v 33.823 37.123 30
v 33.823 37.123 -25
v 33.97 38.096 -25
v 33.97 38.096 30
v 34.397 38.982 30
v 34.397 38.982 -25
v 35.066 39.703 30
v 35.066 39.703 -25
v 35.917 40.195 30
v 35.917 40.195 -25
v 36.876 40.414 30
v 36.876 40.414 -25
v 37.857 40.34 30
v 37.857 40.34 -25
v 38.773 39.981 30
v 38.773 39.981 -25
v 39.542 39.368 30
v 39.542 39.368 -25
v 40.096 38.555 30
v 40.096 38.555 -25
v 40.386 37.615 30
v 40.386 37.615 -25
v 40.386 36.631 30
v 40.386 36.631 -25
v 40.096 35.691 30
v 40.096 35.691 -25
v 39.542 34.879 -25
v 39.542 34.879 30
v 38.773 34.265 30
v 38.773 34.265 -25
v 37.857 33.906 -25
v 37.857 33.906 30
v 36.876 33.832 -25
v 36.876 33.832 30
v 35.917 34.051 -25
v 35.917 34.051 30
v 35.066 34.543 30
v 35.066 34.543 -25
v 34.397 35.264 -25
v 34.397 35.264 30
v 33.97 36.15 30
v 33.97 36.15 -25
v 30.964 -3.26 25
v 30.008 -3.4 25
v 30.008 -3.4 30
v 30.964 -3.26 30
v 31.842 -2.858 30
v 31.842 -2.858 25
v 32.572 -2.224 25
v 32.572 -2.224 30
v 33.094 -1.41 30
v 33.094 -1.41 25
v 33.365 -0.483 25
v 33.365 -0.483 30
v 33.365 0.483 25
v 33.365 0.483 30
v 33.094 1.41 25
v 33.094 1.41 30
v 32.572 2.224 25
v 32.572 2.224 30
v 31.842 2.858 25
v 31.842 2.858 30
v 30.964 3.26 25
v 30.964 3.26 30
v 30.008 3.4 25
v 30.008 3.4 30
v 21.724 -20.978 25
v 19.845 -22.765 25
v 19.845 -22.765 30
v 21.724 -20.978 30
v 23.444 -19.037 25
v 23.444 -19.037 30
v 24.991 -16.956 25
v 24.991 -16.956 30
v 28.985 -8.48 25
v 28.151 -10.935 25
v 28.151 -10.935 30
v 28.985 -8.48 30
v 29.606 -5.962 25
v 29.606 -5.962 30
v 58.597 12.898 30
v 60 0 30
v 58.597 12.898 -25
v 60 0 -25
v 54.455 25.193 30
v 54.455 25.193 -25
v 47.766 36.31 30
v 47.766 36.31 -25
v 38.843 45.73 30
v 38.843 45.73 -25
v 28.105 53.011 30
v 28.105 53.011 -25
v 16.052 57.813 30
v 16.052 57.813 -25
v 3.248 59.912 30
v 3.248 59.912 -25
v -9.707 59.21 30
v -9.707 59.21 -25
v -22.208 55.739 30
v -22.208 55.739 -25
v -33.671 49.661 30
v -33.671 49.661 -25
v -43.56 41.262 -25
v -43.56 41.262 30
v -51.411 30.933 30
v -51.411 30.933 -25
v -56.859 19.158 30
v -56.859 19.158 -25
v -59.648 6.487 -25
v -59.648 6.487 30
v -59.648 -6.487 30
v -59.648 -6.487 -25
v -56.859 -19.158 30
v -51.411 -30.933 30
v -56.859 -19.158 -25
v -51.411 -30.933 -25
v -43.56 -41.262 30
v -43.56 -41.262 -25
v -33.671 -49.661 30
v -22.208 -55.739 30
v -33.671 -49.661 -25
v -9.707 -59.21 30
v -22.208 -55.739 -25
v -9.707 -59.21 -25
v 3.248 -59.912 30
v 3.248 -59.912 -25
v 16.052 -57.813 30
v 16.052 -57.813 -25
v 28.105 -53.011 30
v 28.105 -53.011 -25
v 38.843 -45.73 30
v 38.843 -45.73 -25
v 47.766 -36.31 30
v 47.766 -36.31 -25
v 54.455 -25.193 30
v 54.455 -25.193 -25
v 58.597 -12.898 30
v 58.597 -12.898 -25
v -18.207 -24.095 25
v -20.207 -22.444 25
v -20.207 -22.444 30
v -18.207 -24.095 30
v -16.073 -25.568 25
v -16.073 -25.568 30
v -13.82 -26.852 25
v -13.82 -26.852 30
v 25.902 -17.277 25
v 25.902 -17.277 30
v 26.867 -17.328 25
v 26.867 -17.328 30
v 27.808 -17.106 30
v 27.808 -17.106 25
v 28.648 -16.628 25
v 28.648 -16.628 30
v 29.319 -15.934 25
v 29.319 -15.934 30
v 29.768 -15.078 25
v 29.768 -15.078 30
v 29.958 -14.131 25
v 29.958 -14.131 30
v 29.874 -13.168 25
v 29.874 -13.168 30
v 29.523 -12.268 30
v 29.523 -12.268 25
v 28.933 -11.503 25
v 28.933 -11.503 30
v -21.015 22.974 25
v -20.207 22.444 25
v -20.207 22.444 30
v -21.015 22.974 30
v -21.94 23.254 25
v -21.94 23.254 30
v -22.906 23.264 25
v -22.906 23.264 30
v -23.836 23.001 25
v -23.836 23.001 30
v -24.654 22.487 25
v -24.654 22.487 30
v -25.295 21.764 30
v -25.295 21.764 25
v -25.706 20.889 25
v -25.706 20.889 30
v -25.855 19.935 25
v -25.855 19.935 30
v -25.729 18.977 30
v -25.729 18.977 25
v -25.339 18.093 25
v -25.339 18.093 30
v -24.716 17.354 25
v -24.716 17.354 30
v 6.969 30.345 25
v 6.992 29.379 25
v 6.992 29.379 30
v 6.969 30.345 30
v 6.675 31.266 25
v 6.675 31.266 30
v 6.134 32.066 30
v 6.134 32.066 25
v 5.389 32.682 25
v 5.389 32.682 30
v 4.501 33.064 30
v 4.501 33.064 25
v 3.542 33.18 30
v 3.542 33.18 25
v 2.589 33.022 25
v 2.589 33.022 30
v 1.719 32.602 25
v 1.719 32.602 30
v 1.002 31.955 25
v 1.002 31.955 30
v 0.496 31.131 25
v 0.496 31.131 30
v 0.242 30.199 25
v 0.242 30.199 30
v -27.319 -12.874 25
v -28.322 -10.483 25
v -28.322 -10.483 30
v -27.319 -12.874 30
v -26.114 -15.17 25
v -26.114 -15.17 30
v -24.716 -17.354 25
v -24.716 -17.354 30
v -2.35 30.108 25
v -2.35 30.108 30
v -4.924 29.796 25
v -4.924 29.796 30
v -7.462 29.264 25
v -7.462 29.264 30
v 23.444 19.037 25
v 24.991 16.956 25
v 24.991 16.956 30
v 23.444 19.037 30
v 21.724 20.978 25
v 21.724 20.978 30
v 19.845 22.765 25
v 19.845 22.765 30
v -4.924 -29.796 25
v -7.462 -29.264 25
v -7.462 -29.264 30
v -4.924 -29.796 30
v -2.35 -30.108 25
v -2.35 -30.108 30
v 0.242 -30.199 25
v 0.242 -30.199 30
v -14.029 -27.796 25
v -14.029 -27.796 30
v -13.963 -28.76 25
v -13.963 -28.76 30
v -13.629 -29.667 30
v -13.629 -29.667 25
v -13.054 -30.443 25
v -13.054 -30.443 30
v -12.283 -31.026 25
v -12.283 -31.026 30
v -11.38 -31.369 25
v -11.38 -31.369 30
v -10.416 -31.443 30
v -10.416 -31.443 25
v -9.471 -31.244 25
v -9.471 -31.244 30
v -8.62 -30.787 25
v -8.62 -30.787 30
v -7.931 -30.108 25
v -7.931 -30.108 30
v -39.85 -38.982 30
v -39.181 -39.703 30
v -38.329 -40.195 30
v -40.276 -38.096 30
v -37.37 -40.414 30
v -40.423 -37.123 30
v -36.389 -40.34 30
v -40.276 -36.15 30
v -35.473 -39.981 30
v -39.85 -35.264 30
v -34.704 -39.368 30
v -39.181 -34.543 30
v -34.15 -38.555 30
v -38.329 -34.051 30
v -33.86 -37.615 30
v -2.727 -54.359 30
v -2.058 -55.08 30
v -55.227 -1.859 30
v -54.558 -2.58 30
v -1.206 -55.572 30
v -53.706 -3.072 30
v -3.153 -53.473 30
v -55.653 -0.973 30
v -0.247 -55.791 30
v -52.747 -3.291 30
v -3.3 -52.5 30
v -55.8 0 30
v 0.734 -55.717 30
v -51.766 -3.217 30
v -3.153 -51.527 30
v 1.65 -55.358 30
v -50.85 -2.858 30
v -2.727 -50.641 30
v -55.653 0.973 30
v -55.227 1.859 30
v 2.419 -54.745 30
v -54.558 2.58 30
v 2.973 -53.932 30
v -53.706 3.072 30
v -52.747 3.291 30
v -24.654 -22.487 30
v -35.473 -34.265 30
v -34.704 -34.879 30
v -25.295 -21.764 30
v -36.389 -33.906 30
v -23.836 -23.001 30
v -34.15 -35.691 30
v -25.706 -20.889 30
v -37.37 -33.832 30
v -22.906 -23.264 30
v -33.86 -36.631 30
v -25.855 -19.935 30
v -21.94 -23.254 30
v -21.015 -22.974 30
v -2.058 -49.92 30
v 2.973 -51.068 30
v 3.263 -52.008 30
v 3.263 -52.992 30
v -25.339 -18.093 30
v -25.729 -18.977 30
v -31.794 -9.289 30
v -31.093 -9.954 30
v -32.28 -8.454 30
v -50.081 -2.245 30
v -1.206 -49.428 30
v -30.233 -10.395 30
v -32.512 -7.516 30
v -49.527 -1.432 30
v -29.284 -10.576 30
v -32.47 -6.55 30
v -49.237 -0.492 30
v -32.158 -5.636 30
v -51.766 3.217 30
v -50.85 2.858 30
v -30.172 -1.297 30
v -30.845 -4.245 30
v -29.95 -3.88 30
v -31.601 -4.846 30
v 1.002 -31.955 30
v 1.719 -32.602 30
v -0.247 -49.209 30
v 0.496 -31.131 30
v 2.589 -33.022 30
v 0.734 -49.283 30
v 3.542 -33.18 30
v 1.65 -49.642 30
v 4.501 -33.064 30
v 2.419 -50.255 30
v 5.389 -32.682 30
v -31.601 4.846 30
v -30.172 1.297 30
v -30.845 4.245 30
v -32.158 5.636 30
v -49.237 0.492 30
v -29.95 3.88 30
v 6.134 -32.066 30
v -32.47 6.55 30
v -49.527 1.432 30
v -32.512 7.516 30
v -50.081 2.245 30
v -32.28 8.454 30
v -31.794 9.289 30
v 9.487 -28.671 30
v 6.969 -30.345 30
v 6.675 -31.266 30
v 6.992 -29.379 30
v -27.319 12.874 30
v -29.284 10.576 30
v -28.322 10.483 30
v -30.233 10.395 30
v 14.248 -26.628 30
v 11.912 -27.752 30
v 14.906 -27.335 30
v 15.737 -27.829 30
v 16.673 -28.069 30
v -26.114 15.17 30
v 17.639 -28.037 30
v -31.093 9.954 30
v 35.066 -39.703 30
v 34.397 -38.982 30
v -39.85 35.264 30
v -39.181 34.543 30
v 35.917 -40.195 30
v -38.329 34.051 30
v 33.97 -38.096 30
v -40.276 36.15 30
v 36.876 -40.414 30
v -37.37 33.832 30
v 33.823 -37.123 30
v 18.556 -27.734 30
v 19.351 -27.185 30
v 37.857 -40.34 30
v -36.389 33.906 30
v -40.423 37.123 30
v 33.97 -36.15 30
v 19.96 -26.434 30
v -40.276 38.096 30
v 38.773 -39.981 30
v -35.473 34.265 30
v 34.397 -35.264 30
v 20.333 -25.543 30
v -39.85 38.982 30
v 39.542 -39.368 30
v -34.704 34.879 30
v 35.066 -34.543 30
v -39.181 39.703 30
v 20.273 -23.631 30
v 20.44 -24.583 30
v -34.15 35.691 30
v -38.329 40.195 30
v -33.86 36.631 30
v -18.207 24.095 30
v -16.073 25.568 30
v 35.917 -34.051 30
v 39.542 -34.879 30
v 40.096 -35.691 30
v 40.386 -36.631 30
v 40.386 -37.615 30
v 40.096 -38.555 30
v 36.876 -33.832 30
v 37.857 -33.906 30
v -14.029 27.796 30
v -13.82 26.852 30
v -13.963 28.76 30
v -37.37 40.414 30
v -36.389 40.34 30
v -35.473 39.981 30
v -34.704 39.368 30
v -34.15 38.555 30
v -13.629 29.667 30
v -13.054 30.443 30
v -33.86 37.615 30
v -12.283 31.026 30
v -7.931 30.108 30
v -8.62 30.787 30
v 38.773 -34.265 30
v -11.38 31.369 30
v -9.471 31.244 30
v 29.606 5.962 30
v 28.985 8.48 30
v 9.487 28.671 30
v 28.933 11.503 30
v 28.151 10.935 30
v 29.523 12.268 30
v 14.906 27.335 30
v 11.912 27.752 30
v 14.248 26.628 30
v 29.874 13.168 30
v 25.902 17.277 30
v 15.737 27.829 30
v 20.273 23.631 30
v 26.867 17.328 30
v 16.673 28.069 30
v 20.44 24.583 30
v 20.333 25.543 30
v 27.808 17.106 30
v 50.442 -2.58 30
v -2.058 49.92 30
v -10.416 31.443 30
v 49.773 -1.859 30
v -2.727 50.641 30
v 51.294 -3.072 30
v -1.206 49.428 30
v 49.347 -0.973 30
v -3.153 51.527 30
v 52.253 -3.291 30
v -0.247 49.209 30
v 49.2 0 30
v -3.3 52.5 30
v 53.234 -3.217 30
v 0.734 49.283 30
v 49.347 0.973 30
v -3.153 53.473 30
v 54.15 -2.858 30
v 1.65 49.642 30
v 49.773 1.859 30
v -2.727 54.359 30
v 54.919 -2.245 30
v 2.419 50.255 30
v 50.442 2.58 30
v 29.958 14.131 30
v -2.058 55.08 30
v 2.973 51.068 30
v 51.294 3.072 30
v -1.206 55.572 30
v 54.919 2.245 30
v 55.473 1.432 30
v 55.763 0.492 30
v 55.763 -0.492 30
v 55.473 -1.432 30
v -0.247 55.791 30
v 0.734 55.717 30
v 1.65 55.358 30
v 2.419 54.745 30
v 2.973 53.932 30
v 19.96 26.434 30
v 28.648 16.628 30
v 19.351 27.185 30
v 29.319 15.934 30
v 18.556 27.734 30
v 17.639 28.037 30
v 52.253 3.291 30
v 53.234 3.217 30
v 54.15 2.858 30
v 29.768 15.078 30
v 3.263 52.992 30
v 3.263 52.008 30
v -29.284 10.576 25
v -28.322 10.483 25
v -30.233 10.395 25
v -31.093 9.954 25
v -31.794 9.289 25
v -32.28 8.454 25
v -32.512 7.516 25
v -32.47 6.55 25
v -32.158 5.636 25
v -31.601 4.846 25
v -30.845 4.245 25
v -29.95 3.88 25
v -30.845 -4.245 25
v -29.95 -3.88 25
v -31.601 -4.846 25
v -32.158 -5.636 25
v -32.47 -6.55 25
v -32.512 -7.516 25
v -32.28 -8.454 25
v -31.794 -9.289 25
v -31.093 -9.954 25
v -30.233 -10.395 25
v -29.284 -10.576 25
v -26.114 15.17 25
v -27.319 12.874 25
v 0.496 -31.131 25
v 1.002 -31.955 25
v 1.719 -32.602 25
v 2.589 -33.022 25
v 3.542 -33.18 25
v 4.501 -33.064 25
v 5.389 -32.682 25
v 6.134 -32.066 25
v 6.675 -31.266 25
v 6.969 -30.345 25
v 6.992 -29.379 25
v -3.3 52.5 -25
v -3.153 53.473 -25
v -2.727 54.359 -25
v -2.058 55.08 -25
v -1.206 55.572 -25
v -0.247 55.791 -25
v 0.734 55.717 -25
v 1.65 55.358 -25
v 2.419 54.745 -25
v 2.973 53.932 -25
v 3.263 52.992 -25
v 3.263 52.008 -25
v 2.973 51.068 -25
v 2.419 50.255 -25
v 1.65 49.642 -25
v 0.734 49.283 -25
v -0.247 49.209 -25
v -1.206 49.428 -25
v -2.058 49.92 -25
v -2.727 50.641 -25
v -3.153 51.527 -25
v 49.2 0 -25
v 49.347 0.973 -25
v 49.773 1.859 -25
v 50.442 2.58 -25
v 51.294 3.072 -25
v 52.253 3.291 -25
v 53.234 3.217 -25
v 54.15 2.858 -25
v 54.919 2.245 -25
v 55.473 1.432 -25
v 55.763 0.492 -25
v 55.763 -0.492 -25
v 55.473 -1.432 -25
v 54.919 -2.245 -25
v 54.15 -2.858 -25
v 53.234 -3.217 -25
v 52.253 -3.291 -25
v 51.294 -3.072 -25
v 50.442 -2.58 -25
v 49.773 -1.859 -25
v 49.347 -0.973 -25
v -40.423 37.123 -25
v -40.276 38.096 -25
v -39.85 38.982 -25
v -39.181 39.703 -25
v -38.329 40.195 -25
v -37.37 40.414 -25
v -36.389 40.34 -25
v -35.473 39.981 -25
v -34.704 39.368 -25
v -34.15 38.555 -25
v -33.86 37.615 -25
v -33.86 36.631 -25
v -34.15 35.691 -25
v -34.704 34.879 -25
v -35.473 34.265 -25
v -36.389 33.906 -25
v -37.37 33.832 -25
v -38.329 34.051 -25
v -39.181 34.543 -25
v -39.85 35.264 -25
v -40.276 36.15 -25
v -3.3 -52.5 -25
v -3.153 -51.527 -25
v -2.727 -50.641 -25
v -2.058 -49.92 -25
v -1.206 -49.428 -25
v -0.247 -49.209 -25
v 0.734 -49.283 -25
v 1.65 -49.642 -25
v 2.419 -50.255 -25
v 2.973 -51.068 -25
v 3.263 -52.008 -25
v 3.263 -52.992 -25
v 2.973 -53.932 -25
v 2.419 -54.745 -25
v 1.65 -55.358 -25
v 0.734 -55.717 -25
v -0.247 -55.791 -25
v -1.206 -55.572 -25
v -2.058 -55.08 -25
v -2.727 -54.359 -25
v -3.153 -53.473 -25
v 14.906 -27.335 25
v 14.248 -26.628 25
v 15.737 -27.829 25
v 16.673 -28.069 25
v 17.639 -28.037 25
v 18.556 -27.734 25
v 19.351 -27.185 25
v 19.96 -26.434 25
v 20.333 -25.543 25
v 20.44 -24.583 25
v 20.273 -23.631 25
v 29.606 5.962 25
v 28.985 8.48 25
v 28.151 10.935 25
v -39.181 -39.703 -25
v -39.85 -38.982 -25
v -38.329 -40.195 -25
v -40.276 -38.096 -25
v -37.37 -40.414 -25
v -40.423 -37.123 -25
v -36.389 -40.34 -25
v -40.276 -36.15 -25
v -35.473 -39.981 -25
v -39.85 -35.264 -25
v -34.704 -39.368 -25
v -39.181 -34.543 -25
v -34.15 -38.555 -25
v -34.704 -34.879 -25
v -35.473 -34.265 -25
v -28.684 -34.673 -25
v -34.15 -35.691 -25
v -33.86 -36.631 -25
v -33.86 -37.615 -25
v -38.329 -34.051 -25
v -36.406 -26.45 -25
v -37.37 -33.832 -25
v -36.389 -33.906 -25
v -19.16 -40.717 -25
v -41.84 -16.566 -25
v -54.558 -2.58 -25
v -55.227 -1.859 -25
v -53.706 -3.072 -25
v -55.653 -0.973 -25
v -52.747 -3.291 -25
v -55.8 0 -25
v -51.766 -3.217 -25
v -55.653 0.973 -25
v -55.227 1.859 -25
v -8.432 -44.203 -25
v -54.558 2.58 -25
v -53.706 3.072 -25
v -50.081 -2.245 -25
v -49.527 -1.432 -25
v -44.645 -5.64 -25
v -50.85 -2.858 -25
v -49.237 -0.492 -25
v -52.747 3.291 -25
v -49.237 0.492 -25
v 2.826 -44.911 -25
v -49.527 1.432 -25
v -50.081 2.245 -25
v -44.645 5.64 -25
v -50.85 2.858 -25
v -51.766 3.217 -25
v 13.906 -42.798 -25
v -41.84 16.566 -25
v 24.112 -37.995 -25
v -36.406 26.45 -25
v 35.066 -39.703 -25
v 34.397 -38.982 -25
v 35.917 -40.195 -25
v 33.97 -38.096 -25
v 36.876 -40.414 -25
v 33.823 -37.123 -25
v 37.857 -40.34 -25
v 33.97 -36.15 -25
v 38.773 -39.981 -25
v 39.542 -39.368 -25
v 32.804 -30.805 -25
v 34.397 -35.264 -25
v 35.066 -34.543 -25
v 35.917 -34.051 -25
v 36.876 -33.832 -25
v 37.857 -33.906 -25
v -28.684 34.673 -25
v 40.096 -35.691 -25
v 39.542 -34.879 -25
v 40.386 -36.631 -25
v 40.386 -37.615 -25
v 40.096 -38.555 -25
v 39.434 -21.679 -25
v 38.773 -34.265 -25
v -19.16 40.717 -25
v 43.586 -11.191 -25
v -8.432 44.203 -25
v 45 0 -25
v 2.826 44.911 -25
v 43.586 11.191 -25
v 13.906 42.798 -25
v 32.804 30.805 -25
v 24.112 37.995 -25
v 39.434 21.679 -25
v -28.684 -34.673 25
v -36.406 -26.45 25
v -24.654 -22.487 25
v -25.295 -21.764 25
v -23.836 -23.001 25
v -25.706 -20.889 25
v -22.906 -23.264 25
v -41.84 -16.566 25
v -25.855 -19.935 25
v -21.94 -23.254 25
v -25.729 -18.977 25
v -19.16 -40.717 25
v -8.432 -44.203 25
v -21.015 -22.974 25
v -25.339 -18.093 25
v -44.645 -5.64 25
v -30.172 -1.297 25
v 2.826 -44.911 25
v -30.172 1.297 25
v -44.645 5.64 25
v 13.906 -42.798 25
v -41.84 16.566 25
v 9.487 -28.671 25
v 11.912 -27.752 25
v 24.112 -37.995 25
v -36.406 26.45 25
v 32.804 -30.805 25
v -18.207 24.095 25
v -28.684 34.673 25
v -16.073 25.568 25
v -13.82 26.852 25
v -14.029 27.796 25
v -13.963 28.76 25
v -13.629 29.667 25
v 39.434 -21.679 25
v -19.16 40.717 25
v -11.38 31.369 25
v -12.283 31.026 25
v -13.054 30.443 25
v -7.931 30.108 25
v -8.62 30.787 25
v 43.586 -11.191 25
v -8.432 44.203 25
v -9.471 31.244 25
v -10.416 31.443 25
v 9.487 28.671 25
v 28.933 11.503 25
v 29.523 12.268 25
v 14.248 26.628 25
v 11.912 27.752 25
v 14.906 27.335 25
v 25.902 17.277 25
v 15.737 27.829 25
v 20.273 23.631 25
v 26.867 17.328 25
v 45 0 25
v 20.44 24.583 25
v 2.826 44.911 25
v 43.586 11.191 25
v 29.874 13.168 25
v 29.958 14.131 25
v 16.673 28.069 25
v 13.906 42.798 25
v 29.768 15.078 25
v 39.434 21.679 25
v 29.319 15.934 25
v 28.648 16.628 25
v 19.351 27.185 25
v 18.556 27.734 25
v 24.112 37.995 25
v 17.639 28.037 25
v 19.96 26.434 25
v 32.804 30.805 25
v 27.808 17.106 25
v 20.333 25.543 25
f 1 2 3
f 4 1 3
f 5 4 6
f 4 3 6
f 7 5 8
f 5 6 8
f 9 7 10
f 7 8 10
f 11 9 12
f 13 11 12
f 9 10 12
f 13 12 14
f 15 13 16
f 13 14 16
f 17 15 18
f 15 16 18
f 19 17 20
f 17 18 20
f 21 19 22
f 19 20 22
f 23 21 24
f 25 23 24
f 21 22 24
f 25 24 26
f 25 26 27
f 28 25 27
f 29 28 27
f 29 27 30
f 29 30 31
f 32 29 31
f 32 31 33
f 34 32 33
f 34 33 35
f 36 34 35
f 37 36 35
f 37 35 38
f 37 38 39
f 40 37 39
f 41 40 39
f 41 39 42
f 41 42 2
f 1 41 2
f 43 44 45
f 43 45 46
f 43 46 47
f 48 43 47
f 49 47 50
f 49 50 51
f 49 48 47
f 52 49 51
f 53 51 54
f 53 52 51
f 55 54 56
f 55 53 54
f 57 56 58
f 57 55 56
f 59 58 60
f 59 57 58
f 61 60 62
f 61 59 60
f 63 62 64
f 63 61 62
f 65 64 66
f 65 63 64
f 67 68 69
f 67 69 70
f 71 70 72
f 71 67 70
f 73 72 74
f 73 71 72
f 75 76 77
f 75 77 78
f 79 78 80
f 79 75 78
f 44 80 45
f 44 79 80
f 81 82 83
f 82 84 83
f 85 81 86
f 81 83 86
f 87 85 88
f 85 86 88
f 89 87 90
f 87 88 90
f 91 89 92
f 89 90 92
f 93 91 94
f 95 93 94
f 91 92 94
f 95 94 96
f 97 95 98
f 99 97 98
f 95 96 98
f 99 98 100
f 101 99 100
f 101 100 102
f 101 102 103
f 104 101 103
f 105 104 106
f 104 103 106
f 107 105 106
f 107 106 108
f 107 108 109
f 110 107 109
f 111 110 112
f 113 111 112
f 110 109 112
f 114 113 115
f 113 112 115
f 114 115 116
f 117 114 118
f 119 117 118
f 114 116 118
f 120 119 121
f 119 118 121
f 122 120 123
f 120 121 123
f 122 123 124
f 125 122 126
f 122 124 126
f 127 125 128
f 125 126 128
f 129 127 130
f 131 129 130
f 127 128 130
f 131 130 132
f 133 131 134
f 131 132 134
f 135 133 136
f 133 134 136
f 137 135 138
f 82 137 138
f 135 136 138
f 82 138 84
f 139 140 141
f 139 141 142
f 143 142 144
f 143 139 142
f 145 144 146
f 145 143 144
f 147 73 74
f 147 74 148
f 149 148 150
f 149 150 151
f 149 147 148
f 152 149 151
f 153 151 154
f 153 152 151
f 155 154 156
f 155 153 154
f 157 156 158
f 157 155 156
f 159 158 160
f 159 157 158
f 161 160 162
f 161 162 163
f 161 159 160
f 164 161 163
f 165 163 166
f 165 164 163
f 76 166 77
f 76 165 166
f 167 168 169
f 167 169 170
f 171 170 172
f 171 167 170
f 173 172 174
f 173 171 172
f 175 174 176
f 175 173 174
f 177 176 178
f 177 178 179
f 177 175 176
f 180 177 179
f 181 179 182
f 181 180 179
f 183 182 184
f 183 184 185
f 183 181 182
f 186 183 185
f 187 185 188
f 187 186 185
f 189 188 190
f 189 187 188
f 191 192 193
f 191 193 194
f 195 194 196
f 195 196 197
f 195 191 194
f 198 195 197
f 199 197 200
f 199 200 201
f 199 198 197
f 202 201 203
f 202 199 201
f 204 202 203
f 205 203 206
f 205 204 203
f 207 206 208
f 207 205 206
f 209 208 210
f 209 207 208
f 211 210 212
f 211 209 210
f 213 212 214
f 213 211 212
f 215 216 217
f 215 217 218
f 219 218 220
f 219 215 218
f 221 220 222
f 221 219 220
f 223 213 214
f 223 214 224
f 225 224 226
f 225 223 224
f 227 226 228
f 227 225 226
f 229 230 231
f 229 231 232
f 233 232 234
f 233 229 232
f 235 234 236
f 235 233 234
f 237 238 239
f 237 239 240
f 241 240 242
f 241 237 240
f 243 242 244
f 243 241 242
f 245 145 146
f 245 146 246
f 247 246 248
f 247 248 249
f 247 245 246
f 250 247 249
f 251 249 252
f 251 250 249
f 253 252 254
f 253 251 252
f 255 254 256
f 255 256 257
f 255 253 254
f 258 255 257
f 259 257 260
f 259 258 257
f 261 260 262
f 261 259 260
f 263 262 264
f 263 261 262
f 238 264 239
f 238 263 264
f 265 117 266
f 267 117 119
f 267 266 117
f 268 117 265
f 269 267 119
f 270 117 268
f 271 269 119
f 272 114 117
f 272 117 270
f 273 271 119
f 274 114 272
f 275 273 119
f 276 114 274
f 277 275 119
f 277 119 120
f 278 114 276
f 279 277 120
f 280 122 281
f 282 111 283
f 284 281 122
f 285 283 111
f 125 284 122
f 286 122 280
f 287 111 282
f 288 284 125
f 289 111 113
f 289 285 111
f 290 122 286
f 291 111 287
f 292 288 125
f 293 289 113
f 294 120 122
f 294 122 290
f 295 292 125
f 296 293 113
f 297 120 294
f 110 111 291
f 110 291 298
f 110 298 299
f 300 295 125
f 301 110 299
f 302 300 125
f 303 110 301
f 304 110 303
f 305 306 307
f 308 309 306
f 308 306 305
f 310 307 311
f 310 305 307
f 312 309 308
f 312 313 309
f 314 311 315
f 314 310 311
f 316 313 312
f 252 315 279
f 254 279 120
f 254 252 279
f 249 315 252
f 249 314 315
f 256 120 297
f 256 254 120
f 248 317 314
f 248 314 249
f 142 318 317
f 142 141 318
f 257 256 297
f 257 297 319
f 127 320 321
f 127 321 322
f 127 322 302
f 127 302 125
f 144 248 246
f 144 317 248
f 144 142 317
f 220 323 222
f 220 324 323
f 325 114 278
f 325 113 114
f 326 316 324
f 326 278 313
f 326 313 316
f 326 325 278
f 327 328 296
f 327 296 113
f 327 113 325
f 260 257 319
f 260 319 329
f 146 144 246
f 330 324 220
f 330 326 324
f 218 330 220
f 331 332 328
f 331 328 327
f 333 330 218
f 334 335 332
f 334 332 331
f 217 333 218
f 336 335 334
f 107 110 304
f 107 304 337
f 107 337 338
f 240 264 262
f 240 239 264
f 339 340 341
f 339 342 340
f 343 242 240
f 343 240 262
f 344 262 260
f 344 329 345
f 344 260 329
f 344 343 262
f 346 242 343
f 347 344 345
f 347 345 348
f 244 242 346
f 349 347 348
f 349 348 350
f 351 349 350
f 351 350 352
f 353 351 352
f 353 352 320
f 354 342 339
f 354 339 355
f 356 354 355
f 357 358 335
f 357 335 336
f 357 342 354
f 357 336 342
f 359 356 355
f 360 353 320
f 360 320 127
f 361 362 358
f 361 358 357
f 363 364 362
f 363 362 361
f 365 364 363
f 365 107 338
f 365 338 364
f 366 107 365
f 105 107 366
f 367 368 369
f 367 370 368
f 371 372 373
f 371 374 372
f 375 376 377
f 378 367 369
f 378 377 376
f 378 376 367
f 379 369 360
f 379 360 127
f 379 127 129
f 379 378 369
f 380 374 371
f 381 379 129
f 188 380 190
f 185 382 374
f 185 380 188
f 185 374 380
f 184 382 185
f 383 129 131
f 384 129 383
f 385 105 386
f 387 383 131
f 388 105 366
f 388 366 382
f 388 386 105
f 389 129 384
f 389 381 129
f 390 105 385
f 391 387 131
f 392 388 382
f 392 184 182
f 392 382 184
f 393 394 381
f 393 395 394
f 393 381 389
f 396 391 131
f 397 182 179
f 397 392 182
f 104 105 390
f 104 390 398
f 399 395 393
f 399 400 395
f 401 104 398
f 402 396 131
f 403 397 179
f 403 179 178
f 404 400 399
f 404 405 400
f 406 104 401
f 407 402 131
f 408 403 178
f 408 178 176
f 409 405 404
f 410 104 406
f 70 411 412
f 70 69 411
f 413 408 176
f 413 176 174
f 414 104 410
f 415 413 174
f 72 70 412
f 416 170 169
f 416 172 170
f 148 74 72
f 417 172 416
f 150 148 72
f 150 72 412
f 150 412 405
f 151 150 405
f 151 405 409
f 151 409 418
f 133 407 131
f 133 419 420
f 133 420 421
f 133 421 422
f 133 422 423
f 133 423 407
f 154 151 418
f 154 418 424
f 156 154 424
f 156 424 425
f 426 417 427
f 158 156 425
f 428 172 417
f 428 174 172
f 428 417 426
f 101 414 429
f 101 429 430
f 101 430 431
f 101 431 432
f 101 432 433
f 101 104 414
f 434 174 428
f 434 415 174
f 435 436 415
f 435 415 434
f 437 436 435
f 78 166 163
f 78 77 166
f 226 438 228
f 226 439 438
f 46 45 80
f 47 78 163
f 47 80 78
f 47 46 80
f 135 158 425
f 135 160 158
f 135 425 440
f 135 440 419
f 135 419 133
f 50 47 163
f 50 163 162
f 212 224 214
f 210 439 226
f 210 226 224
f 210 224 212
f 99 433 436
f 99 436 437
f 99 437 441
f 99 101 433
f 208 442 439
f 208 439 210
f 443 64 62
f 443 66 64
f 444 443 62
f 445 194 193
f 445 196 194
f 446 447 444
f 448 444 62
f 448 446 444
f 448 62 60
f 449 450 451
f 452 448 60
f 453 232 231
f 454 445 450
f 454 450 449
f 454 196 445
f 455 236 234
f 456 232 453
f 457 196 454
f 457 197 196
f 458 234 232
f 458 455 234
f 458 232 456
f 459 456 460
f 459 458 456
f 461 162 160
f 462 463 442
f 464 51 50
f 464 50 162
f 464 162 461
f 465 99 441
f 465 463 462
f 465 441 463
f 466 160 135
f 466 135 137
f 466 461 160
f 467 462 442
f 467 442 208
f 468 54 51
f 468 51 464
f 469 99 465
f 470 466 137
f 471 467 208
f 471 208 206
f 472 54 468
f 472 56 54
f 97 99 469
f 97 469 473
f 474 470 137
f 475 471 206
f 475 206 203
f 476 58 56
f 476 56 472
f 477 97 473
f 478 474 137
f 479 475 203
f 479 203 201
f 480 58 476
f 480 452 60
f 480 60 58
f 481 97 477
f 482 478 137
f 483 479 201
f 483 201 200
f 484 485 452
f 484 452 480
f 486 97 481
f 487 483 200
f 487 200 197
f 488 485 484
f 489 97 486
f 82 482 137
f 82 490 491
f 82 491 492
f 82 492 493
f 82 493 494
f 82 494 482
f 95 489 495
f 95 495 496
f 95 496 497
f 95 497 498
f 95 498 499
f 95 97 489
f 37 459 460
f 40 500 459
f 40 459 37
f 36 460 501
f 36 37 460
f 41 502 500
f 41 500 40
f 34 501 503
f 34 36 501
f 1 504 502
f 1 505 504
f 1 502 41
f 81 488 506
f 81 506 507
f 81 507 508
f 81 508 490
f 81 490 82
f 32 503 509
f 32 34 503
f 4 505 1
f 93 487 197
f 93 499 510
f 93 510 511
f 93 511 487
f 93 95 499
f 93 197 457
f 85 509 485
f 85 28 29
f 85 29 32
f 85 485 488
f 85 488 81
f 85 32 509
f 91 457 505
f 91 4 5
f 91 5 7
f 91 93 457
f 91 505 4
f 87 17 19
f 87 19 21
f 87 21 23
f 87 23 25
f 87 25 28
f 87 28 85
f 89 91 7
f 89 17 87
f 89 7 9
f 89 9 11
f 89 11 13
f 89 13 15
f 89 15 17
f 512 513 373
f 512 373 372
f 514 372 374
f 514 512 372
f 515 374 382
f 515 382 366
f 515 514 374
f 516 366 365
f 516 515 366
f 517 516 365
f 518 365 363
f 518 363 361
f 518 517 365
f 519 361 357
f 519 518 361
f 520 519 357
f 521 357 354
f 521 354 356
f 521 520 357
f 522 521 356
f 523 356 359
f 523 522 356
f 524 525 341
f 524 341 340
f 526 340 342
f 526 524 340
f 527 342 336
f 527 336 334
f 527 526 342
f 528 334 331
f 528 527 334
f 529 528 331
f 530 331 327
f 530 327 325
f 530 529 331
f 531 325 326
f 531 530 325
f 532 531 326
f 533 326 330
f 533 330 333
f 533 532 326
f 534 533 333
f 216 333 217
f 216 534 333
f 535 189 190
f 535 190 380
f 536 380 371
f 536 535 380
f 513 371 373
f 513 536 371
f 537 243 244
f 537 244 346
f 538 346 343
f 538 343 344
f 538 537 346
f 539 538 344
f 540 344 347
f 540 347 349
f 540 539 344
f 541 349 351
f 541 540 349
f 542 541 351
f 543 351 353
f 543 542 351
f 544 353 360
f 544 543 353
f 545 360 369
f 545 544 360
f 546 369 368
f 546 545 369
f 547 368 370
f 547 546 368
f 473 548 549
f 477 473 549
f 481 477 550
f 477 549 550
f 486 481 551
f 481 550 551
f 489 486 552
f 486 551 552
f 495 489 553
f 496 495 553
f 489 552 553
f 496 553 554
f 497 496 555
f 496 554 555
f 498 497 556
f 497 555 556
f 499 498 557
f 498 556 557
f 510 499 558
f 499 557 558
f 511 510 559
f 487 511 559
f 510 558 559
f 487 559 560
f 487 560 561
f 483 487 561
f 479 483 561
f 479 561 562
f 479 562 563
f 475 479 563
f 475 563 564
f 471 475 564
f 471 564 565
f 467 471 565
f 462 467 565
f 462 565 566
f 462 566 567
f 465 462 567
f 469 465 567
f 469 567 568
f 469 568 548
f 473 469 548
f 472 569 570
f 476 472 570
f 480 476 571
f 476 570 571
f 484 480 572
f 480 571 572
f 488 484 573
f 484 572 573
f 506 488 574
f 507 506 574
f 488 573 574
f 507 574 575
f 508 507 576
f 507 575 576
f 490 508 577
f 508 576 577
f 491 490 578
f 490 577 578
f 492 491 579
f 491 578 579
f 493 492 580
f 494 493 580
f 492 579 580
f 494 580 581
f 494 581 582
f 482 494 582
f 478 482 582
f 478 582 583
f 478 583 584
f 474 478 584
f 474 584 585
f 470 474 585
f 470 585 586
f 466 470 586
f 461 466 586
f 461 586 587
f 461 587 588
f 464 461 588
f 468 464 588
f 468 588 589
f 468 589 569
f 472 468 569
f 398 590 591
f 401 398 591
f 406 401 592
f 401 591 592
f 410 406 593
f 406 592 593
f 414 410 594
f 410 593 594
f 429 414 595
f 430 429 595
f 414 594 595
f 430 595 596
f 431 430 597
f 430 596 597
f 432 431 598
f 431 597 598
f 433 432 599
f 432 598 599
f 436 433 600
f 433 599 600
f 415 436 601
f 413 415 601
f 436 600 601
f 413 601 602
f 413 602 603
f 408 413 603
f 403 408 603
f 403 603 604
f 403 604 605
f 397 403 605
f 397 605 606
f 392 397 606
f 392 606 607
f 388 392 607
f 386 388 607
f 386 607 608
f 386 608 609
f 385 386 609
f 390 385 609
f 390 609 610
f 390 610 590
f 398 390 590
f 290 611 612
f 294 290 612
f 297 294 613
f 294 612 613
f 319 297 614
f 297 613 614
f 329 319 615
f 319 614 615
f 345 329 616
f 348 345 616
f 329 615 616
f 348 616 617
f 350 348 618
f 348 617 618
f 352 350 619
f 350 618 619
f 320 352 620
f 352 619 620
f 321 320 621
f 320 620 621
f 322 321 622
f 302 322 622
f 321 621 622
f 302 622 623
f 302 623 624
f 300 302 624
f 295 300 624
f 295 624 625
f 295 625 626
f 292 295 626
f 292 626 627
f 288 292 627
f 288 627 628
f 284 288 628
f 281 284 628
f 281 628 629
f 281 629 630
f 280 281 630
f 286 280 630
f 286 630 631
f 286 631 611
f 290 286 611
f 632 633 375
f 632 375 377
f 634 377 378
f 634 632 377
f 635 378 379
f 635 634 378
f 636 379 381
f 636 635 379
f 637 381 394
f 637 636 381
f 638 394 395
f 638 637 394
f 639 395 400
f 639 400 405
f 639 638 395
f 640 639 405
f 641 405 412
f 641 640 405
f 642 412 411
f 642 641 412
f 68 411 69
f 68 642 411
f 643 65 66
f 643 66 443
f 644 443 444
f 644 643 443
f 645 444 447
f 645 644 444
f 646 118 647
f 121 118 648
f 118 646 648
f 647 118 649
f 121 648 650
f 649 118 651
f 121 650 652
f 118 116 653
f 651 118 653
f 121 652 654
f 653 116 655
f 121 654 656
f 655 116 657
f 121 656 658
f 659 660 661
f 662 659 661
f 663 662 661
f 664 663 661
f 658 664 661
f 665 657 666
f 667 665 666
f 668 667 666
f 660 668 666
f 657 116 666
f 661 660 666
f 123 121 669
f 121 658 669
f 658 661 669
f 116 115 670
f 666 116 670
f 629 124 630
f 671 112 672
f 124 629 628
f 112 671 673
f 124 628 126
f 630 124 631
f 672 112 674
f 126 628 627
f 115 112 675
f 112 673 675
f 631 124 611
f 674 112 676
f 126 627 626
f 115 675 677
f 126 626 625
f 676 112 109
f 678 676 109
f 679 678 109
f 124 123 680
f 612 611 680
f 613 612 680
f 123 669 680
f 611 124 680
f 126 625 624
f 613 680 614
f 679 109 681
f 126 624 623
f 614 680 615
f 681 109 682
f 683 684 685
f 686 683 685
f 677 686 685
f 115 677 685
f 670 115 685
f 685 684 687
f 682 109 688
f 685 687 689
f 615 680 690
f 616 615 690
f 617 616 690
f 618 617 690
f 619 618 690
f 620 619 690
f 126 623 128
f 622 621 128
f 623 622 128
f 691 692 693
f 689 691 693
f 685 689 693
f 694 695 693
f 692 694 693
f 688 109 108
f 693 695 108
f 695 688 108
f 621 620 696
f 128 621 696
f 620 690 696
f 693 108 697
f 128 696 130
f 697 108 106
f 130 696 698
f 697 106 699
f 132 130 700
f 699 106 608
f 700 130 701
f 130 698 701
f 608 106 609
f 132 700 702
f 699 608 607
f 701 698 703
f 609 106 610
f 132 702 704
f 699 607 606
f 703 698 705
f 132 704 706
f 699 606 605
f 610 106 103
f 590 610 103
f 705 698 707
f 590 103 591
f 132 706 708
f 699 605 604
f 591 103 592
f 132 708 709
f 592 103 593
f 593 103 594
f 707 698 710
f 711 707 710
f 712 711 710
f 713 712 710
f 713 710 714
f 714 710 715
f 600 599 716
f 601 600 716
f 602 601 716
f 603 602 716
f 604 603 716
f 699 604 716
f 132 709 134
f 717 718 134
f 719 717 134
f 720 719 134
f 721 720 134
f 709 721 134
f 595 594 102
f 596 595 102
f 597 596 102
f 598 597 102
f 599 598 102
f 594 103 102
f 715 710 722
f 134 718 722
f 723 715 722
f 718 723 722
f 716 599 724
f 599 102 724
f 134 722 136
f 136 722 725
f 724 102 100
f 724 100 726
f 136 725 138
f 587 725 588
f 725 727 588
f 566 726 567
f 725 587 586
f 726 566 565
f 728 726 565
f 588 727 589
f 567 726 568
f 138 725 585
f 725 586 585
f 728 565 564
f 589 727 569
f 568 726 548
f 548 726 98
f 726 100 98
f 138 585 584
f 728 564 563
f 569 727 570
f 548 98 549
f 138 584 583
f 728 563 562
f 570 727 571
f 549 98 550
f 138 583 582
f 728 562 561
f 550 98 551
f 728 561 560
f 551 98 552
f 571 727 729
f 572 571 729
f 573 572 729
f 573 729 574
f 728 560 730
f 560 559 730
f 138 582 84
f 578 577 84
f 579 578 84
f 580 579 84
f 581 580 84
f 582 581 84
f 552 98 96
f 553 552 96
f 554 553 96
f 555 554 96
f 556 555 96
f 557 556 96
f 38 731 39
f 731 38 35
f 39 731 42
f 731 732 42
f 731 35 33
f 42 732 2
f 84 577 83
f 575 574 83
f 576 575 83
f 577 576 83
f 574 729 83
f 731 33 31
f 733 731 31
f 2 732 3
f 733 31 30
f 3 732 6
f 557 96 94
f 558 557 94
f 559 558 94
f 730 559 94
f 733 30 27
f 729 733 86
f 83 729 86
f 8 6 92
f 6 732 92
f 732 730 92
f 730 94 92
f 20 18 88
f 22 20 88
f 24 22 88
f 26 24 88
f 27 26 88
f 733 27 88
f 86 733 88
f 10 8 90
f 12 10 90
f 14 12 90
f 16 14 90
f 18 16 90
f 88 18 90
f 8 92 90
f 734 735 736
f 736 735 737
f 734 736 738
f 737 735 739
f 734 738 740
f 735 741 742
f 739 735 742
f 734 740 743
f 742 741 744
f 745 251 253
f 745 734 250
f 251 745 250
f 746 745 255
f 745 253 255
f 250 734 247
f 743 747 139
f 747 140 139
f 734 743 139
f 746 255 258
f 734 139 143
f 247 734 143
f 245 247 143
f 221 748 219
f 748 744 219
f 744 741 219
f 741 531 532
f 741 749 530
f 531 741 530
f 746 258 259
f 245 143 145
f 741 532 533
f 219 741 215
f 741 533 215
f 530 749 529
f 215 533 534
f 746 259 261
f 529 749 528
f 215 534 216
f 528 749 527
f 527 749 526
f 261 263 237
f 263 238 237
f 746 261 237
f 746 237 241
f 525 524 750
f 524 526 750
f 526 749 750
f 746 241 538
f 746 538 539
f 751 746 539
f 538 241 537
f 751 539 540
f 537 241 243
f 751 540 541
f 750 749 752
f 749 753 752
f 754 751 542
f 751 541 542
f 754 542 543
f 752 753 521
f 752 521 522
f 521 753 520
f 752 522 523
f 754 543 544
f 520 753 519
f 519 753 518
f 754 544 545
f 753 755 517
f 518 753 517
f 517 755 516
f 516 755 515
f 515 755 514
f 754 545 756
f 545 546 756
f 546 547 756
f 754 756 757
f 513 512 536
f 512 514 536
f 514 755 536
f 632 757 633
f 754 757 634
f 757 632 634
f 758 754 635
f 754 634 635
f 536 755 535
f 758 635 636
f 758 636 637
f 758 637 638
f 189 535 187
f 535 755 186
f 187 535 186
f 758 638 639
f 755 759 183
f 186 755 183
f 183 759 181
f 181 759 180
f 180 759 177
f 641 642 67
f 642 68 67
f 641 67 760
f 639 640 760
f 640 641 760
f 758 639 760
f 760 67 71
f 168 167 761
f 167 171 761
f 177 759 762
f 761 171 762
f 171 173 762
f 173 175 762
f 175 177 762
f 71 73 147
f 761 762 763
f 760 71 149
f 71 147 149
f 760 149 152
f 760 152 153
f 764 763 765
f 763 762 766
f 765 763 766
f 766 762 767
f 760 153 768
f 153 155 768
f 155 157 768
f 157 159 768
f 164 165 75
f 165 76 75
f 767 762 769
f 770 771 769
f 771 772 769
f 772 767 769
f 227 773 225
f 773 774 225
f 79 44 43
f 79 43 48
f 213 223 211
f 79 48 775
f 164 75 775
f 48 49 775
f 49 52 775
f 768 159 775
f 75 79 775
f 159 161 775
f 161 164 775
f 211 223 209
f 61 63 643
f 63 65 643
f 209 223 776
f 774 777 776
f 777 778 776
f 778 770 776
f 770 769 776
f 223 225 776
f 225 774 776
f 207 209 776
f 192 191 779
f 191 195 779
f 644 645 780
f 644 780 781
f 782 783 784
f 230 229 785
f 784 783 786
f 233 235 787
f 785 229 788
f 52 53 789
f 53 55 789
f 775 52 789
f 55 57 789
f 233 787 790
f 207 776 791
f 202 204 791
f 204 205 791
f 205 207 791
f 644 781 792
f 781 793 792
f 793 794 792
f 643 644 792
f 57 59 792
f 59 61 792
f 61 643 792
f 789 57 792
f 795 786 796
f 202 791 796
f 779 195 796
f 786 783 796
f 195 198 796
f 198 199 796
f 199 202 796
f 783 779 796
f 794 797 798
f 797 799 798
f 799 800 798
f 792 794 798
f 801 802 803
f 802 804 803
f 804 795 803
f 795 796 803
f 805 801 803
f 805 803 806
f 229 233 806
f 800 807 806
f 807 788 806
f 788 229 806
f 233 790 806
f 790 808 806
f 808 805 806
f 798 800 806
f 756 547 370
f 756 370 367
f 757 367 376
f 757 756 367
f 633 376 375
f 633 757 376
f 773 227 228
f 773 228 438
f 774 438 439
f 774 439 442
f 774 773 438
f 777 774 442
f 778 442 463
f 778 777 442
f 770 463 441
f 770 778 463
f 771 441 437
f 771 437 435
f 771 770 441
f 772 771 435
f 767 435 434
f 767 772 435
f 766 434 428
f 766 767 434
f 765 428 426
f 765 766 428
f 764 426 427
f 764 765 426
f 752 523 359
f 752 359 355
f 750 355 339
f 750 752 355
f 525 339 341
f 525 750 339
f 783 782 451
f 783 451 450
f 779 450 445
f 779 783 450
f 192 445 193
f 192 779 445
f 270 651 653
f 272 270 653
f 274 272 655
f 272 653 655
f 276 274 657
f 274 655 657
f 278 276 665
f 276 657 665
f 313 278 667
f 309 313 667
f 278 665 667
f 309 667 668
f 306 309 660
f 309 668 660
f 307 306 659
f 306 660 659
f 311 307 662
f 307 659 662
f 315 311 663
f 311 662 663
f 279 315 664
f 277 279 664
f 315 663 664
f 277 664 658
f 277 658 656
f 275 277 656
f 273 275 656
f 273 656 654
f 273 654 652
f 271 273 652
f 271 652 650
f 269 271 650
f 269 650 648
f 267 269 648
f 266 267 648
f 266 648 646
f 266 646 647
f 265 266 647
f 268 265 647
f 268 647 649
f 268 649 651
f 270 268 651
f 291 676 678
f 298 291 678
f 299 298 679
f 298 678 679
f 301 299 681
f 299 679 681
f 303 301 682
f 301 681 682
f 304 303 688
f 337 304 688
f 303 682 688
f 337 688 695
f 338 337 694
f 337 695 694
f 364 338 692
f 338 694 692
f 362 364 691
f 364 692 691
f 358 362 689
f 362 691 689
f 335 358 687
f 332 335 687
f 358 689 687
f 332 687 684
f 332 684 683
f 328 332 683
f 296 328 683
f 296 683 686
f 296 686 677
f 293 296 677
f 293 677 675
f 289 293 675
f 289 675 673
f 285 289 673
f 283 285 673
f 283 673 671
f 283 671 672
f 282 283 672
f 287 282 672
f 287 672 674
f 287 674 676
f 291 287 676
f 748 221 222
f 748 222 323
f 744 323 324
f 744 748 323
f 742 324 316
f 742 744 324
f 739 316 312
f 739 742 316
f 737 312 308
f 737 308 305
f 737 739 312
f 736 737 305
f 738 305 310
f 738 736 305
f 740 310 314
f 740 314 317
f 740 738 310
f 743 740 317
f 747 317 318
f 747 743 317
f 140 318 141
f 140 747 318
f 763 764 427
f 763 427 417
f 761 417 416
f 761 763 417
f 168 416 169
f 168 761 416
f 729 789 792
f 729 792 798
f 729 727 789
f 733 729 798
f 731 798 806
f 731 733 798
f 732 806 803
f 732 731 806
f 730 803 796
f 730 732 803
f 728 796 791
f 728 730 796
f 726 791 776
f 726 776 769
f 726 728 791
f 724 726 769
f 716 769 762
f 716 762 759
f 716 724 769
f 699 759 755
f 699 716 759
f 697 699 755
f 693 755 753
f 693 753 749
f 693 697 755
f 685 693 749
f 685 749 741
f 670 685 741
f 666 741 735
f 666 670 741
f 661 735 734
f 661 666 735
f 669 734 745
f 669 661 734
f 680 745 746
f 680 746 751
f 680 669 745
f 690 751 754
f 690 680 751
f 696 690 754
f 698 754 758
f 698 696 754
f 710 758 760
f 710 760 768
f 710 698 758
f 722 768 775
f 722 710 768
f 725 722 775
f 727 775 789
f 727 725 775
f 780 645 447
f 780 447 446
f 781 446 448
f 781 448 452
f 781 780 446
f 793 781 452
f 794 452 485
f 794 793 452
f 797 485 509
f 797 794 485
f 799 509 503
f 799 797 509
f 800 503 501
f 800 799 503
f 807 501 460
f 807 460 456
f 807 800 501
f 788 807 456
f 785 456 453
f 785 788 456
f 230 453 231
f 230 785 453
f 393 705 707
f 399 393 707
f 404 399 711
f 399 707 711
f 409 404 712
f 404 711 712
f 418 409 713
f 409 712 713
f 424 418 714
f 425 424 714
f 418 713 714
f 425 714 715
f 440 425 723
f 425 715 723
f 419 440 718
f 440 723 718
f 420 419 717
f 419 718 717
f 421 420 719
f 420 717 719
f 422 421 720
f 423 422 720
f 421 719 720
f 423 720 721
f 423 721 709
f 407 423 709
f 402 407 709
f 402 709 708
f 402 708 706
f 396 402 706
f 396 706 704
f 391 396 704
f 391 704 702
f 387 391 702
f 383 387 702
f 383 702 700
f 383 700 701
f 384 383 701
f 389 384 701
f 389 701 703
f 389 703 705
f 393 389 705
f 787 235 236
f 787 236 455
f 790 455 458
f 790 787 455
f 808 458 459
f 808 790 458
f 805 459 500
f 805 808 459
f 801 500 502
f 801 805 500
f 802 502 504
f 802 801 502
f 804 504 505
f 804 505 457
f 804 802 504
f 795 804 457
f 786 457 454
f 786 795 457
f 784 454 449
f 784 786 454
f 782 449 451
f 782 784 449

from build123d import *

# Parameters (mm, degrees)
SKETCH2_R            = 60
SKETCH2_R_2          = 45
BOSS_EXTRUDE2_DEPTH  = 25
SKETCH3_R            = 60
BOSS_EXTRUDE3_DEPTH  = 5
M6_CLEARANCE_HOLE1_D = 6.6


with BuildPart() as part:
    # Sketch2 → Boss-Extrude2 (new body, symmetric)
    with BuildSketch(Plane.XY):
        Circle(SKETCH2_R)
        Circle(SKETCH2_R_2, mode=Mode.SUBTRACT)
    extrude(amount=BOSS_EXTRUDE2_DEPTH, both=True)

    # Sketch3 → Boss-Extrude3 (add)
    with BuildSketch(Plane.XY.offset(25)):
        Circle(SKETCH3_R)
        with BuildLine():
            ThreePointArc((24.990710007, 16.9559551), (22.605024595, 20.026304279), (19.844624318, 22.764685055))
            ThreePointArc((19.844624318, 22.764685055), (18.973362541, 27.487661121), (14.248349522, 26.62751464))
            ThreePointArc((14.248349522, 26.62751464), (10.709067589, 28.237490529), (6.99226553, 29.379384316))
            ThreePointArc((6.99226553, 29.379384316), (4.025925121, 33.156476395), (0.241863872, 30.199031472))
            ThreePointArc((0.241863872, 30.199031472), (-3.640207744, 29.979807998), (-7.461937025, 29.263620689))
            ThreePointArc((-7.461937025, 29.263620689), (-11.843803227, 31.229542506), (-13.820029875, 26.852314132))
            ThreePointArc((-13.820029875, 26.852314132), (-17.155555351, 24.85411275), (-20.206699734, 22.443914227))
            ThreePointArc((-20.206699734, 22.443914227), (-25.000258989, 22.148296785), (-24.715921328, 17.35405523))
            ThreePointArc((-24.715921328, 17.35405523), (-26.740771975, 14.034639796), (-28.322351051, 10.482577495))
            ThreePointArc((-28.322351051, 10.482577495), (-32.429456702, 7.993143187), (-29.949693064, 3.880191413))
            ThreePointArc((-29.949693064, 3.880191413), (-30.2, 0), (-29.949693064, -3.880191413))
            ThreePointArc((-29.949693064, -3.880191413), (-32.429456702, -7.993143187), (-28.322351051, -10.482577495))
            ThreePointArc((-28.322351051, -10.482577495), (-26.740771975, -14.034639796), (-24.715921328, -17.35405523))
            ThreePointArc((-24.715921328, -17.35405523), (-25.000258989, -22.148296785), (-20.206699734, -22.443914227))
            ThreePointArc((-20.206699734, -22.443914227), (-17.155555351, -24.85411275), (-13.820029875, -26.852314132))
            ThreePointArc((-13.820029875, -26.852314132), (-11.843803227, -31.229542506), (-7.461937025, -29.263620689))
            ThreePointArc((-7.461937025, -29.263620689), (-3.640207744, -29.979807998), (0.241863872, -30.199031472))
            ThreePointArc((0.241863872, -30.199031472), (4.025925121, -33.156476395), (6.99226553, -29.379384316))
            ThreePointArc((6.99226553, -29.379384316), (10.709067589, -28.237490529), (14.248349522, -26.62751464))
            ThreePointArc((14.248349522, -26.62751464), (18.973362541, -27.487661121), (19.844624318, -22.764685055))
            ThreePointArc((19.844624318, -22.764685055), (22.605024595, -20.026304279), (24.990710007, -16.9559551))
            ThreePointArc((24.990710007, -16.9559551), (29.574231257, -15.521753946), (28.150818829, -10.934870793))
            ThreePointArc((28.150818829, -10.934870793), (29.322442886, -7.227333061), (30.008, -3.399990588))
            ThreePointArc((30.008, -3.399990588), (33.4, 0), (30.008, 3.399990588))
            ThreePointArc((30.008, 3.399990588), (29.322442886, 7.227333061), (28.150818829, 10.934870793))
            ThreePointArc((28.150818829, 10.934870793), (29.574231257, 15.521753946), (24.990710007, 16.9559551))
        make_face(mode=Mode.SUBTRACT)
    extrude(amount=BOSS_EXTRUDE3_DEPTH)

    # M6 Clearance Hole1 (through all)
    with Locations(Plane.XY.offset(30)):
        with Locations((-37.123106012, 37.123106012), (0, 52.5), (37.123106012, 37.123106012), (52.5, 0), (37.123106012, -37.123106012), (0, -52.5), (-37.123106012, -37.123106012), (-52.5, 0)):
            Hole(M6_CLEARANCE_HOLE1_D / 2)


solid = part.part
